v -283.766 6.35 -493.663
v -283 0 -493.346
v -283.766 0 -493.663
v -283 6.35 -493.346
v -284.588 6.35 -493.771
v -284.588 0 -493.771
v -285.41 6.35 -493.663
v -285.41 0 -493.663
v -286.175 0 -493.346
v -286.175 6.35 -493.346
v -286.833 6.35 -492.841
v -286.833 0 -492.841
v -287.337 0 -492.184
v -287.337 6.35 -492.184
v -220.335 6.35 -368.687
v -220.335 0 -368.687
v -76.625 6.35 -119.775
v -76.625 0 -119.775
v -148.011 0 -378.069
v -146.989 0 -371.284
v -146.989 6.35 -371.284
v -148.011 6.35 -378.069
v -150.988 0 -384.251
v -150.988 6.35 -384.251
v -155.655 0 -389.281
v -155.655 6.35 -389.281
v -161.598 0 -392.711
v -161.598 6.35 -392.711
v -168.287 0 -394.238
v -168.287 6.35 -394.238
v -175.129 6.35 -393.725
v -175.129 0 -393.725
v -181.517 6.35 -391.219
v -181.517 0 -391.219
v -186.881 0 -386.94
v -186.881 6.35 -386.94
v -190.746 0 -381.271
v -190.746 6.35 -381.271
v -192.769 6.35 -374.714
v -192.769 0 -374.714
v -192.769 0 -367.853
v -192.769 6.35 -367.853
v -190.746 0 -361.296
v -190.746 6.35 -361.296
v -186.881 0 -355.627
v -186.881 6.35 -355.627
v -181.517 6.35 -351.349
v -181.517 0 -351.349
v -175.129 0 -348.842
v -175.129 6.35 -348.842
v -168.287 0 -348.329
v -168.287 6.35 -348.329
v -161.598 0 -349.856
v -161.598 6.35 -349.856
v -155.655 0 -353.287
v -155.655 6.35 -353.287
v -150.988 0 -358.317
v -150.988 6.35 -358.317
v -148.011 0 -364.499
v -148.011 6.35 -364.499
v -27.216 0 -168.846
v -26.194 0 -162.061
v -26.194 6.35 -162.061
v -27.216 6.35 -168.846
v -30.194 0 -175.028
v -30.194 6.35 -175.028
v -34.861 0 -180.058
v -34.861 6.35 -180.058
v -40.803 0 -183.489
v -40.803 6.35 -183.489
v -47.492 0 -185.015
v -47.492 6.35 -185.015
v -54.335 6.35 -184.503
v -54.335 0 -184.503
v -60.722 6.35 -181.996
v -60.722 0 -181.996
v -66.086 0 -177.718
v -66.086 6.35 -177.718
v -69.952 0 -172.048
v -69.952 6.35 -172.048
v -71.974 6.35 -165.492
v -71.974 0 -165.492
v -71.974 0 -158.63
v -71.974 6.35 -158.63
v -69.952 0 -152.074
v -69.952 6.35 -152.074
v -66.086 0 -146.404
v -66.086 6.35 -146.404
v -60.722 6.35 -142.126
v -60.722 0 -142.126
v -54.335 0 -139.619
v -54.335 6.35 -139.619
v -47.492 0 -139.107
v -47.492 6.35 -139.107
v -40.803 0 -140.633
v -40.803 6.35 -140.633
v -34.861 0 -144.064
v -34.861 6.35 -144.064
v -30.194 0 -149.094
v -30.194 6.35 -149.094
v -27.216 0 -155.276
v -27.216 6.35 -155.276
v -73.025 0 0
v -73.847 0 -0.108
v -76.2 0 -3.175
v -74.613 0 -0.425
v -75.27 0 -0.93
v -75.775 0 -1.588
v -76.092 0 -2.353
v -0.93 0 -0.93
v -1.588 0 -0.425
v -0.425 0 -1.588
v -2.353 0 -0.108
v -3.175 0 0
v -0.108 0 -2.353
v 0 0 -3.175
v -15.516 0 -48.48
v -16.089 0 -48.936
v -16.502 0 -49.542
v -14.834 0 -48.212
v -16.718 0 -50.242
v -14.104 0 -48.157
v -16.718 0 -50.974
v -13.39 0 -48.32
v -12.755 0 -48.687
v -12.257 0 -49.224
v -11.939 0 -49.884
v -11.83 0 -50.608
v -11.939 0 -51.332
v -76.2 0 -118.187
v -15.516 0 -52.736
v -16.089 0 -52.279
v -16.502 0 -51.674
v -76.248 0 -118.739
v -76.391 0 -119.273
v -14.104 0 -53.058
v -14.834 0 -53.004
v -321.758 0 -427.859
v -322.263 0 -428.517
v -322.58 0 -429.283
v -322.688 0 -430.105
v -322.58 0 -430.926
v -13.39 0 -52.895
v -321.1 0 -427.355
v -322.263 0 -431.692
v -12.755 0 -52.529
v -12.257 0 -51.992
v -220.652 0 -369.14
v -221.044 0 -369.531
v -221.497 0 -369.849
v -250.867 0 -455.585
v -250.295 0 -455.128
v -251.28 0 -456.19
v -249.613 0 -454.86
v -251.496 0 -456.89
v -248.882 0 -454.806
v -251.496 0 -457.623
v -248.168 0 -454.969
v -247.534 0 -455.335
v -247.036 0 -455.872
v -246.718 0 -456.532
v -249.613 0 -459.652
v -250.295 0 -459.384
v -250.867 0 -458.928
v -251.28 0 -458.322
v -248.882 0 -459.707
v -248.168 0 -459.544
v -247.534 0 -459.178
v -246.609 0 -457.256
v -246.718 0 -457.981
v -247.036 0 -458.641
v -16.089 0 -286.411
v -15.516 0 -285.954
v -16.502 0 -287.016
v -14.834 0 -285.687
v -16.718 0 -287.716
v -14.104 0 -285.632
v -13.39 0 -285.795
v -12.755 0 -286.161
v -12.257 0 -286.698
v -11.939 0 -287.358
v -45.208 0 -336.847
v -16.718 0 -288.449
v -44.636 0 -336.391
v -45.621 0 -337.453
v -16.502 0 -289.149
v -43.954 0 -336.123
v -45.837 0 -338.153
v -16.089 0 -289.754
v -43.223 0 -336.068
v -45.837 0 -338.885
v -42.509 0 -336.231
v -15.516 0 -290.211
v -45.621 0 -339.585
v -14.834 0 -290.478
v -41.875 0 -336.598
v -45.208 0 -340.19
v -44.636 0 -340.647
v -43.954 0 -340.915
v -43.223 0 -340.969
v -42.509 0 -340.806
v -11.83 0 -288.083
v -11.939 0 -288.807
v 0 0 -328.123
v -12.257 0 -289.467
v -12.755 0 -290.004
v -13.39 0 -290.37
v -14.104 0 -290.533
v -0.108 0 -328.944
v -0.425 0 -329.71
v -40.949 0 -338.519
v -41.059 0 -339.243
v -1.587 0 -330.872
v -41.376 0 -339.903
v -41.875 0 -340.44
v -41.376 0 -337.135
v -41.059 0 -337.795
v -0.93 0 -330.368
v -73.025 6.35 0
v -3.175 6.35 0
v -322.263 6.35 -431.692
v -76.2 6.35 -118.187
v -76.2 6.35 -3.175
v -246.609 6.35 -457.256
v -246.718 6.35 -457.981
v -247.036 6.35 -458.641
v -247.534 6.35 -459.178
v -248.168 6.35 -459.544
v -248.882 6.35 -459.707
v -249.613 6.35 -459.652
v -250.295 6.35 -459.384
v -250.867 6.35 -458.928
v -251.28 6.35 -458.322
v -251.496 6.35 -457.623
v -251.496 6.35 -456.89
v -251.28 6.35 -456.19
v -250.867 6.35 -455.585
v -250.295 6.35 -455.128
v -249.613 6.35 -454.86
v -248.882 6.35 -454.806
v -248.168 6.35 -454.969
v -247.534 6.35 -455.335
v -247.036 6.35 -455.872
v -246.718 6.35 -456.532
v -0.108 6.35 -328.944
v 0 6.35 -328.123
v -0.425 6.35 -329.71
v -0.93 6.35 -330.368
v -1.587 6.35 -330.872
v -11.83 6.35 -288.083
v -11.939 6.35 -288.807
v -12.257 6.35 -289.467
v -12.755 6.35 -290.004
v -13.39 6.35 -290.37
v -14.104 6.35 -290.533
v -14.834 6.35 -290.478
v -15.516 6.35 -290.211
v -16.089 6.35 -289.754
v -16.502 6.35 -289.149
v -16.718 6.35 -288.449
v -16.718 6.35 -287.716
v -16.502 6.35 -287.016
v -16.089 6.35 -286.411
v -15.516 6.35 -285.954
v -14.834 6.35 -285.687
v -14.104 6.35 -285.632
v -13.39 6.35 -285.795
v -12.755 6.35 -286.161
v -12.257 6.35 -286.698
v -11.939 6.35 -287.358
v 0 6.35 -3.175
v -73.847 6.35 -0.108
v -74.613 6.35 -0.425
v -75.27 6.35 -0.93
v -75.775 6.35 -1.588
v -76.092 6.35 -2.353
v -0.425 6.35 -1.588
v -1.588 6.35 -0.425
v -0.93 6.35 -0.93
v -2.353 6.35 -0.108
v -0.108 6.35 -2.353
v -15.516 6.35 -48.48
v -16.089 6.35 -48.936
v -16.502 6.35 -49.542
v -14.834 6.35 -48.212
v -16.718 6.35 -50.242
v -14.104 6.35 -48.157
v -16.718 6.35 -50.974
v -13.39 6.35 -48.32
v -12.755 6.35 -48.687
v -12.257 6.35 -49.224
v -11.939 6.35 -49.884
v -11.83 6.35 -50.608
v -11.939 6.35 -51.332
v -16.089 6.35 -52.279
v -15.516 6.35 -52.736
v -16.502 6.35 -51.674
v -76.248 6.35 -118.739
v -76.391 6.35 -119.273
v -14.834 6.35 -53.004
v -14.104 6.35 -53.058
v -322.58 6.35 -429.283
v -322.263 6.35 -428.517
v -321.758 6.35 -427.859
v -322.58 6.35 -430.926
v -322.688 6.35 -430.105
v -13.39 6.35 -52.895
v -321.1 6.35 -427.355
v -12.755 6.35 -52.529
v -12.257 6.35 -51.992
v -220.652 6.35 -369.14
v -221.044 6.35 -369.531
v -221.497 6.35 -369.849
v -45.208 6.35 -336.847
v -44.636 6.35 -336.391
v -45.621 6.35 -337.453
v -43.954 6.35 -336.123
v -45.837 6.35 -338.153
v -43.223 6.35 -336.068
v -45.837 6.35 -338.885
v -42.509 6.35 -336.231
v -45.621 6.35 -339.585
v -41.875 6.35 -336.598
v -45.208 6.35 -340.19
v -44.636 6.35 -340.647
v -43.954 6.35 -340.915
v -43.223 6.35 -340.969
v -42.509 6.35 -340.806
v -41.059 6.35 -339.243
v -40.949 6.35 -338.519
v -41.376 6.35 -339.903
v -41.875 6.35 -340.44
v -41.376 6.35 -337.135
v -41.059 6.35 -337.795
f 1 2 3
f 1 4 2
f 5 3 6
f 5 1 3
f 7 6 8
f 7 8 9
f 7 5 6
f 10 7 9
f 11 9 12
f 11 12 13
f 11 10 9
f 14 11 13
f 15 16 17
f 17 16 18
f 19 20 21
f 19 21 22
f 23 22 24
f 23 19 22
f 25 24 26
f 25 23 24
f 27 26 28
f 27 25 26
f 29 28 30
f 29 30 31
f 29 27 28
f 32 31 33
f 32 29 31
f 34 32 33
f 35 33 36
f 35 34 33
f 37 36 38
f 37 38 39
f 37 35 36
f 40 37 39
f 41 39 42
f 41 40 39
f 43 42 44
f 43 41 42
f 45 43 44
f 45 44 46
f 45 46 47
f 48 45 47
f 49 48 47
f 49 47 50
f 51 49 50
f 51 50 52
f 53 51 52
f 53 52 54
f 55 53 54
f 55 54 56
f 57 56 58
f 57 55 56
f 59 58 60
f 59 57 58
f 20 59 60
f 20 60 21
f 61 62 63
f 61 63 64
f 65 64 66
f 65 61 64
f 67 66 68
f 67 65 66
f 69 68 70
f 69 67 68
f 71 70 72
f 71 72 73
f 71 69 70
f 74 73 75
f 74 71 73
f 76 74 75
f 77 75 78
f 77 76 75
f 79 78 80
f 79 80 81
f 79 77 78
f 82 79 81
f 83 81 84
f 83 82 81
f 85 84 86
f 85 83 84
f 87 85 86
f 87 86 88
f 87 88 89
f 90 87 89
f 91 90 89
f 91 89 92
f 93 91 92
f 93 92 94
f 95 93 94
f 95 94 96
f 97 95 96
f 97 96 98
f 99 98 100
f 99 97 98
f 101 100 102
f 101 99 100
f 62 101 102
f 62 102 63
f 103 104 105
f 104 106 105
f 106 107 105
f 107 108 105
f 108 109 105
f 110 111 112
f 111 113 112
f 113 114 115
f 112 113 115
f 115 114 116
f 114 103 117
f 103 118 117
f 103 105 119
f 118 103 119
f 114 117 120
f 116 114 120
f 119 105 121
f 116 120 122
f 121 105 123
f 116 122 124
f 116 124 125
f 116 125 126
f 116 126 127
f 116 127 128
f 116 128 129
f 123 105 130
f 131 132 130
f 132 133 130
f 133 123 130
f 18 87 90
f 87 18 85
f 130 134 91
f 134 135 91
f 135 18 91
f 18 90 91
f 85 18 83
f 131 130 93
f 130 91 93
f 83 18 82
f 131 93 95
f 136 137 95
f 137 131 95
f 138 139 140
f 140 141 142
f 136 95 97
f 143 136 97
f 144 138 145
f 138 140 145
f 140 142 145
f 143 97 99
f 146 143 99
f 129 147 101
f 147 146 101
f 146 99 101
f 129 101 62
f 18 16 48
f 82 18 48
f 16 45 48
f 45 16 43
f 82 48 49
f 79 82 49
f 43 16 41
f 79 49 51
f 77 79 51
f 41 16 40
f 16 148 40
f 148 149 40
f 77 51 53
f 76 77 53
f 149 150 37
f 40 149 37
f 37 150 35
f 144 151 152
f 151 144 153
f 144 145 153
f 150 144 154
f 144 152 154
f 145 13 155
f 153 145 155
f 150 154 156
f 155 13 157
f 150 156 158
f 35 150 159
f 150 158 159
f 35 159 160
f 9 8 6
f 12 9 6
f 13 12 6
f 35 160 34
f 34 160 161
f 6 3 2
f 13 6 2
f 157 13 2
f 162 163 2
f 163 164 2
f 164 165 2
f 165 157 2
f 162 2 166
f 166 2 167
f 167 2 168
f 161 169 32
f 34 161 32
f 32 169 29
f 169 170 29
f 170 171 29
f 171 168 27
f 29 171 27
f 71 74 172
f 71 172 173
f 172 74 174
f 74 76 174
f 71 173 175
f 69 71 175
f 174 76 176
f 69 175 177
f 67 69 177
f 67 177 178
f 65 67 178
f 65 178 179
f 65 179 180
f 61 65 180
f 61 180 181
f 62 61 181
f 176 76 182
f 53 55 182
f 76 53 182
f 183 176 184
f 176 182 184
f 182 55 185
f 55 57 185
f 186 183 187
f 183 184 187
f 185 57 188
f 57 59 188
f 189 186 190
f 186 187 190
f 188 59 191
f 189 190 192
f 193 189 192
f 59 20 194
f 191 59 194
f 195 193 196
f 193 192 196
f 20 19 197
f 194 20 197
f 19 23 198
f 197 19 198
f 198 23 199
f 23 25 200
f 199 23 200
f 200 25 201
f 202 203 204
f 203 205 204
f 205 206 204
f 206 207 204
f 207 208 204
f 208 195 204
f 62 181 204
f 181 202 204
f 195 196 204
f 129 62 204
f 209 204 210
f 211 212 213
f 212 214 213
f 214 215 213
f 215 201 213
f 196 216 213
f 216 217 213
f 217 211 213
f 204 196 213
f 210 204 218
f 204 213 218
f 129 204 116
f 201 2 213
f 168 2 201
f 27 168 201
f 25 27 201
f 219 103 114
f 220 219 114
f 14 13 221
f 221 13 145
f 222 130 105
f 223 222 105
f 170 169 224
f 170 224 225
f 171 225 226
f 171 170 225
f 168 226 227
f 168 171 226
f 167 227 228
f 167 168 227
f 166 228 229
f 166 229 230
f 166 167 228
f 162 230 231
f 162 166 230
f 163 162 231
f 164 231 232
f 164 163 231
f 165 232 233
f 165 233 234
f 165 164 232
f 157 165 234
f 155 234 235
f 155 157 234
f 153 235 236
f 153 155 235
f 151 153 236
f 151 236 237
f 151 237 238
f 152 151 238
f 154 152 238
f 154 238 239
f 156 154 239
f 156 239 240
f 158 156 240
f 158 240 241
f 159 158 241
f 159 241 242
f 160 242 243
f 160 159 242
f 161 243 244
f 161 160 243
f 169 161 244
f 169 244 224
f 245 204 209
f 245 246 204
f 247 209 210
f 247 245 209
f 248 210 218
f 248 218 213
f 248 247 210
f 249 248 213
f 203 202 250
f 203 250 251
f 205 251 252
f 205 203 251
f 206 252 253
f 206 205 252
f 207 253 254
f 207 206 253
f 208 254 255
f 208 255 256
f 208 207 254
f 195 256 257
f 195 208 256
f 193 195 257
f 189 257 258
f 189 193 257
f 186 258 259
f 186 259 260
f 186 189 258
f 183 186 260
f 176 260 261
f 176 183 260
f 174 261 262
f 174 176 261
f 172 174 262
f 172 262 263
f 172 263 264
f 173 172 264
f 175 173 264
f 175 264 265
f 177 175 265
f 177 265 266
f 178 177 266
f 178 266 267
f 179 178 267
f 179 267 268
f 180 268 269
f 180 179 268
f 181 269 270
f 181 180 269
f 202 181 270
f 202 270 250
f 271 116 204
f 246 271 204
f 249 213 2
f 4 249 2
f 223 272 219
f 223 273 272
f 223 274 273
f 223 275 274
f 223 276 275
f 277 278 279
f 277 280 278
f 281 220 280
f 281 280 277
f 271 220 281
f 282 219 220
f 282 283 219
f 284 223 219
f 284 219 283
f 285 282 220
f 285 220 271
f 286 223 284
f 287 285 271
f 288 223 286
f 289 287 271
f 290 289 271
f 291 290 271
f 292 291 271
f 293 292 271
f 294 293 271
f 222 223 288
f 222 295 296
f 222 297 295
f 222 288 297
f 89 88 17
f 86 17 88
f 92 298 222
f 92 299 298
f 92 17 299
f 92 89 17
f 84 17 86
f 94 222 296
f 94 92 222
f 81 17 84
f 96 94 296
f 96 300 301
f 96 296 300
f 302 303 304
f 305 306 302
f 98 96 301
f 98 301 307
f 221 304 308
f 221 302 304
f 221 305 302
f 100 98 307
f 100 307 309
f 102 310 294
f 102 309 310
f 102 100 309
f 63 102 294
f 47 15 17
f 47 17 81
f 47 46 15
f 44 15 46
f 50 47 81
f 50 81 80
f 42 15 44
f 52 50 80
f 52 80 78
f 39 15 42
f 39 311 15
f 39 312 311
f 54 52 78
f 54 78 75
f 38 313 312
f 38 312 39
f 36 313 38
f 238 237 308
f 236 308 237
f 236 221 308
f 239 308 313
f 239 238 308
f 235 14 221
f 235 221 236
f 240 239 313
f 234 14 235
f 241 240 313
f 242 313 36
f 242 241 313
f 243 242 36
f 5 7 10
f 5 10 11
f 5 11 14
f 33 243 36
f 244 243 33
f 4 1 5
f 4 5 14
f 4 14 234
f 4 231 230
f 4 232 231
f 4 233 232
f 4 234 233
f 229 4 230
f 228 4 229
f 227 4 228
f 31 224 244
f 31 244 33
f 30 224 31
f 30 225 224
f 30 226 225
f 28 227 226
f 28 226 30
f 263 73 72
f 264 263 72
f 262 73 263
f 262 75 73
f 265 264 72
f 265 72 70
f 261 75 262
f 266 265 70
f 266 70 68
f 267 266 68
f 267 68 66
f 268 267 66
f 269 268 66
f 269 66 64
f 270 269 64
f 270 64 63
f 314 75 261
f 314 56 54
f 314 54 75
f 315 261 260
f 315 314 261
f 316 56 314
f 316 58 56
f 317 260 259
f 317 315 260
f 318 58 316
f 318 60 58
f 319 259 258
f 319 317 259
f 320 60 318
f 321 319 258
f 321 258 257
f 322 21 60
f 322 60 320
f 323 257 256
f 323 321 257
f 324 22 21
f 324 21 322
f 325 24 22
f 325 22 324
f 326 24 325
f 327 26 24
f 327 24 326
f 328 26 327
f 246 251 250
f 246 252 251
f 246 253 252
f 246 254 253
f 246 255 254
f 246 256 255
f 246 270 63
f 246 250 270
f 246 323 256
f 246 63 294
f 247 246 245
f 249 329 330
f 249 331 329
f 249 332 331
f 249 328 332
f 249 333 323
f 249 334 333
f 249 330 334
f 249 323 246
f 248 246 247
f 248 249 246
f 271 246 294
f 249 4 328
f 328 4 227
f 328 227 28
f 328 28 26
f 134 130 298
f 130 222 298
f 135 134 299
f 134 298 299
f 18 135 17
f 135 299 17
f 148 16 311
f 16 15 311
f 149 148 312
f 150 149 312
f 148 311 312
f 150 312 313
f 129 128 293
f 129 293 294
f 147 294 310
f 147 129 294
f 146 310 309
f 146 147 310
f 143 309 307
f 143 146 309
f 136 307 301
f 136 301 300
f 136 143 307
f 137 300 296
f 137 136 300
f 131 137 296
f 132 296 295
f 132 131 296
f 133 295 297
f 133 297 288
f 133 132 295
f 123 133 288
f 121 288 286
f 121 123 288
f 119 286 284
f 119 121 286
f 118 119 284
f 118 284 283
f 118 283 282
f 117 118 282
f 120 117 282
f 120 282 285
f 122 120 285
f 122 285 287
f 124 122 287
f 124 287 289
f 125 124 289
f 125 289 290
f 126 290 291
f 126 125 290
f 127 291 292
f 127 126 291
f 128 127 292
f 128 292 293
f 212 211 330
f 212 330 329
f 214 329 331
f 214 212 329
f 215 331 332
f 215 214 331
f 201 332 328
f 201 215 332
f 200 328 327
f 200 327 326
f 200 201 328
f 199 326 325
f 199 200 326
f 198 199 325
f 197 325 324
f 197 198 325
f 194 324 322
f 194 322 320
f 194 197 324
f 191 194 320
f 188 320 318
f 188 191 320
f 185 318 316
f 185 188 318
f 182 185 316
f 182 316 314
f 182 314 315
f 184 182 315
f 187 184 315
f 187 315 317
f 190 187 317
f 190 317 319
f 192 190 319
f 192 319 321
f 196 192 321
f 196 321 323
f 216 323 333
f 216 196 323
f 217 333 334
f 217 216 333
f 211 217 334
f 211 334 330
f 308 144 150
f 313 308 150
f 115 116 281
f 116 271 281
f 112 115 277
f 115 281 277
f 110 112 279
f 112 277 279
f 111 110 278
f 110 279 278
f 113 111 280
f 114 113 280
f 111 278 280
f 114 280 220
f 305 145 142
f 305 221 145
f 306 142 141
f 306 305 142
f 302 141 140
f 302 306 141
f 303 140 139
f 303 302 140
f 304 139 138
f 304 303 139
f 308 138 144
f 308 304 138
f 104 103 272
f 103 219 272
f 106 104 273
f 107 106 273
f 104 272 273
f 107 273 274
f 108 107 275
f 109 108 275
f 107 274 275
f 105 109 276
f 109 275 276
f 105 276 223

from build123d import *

# Parameters (mm, degrees)
SKETCH1_R           = 23.01875
SKETCH1_R_2         = 2.45745
BOSS_EXTRUDE1_DEPTH = 6.35
FILLET1_R           = 3.175


with BuildPart() as part:
    # Sketch1 → Boss-Extrude1 (new body)
    with BuildSketch(Plane(origin=(0, 0, 0), x_dir=(1, 0, 0), z_dir=(0, 1, 0))):
        Polygon((0, 0), (0, 329.955678842), (-285.75, 494.933518263), (-323.85, 428.942382494), (-220.760110958, 369.423407305), (-76.2, 119.037950379), (-76.2, 0), align=None)
        with Locations((-49.2125, 162.06103122)):
            Circle(SKETCH1_R, mode=Mode.SUBTRACT)
        with Locations((-170.00728, 371.283727469)):
            Circle(SKETCH1_R, mode=Mode.SUBTRACT)
        with Locations((-14.2875, 50.607868786)):
            Circle(SKETCH1_R_2, mode=Mode.SUBTRACT)
        with Locations((-14.2875, 288.082628786)):
            Circle(SKETCH1_R_2, mode=Mode.SUBTRACT)
        with Locations((-43.406875082, 338.518865913)):
            Circle(SKETCH1_R_2, mode=Mode.SUBTRACT)
        with Locations((-249.06605, 457.256245913)):
            Circle(SKETCH1_R_2, mode=Mode.SUBTRACT)
    extrude(amount=BOSS_EXTRUDE1_DEPTH)

    # Fillet1
    fillet1_edges = [part.edges().sort_by_distance(p)[0] for p in [
        (-76.2, 3.175, 0),
        (-76.2, 3.175, -119.037950379),
        (-220.760110958, 3.175, -369.423407305),
        (-323.85, 3.175, -428.942382494),
        (-285.75, 3.175, -494.933518263),
        (0, 3.175, -329.955678842),
        (0, 3.175, 0),
    ]]
    fillet(fillet1_edges, radius=FILLET1_R)


solid = part.part
